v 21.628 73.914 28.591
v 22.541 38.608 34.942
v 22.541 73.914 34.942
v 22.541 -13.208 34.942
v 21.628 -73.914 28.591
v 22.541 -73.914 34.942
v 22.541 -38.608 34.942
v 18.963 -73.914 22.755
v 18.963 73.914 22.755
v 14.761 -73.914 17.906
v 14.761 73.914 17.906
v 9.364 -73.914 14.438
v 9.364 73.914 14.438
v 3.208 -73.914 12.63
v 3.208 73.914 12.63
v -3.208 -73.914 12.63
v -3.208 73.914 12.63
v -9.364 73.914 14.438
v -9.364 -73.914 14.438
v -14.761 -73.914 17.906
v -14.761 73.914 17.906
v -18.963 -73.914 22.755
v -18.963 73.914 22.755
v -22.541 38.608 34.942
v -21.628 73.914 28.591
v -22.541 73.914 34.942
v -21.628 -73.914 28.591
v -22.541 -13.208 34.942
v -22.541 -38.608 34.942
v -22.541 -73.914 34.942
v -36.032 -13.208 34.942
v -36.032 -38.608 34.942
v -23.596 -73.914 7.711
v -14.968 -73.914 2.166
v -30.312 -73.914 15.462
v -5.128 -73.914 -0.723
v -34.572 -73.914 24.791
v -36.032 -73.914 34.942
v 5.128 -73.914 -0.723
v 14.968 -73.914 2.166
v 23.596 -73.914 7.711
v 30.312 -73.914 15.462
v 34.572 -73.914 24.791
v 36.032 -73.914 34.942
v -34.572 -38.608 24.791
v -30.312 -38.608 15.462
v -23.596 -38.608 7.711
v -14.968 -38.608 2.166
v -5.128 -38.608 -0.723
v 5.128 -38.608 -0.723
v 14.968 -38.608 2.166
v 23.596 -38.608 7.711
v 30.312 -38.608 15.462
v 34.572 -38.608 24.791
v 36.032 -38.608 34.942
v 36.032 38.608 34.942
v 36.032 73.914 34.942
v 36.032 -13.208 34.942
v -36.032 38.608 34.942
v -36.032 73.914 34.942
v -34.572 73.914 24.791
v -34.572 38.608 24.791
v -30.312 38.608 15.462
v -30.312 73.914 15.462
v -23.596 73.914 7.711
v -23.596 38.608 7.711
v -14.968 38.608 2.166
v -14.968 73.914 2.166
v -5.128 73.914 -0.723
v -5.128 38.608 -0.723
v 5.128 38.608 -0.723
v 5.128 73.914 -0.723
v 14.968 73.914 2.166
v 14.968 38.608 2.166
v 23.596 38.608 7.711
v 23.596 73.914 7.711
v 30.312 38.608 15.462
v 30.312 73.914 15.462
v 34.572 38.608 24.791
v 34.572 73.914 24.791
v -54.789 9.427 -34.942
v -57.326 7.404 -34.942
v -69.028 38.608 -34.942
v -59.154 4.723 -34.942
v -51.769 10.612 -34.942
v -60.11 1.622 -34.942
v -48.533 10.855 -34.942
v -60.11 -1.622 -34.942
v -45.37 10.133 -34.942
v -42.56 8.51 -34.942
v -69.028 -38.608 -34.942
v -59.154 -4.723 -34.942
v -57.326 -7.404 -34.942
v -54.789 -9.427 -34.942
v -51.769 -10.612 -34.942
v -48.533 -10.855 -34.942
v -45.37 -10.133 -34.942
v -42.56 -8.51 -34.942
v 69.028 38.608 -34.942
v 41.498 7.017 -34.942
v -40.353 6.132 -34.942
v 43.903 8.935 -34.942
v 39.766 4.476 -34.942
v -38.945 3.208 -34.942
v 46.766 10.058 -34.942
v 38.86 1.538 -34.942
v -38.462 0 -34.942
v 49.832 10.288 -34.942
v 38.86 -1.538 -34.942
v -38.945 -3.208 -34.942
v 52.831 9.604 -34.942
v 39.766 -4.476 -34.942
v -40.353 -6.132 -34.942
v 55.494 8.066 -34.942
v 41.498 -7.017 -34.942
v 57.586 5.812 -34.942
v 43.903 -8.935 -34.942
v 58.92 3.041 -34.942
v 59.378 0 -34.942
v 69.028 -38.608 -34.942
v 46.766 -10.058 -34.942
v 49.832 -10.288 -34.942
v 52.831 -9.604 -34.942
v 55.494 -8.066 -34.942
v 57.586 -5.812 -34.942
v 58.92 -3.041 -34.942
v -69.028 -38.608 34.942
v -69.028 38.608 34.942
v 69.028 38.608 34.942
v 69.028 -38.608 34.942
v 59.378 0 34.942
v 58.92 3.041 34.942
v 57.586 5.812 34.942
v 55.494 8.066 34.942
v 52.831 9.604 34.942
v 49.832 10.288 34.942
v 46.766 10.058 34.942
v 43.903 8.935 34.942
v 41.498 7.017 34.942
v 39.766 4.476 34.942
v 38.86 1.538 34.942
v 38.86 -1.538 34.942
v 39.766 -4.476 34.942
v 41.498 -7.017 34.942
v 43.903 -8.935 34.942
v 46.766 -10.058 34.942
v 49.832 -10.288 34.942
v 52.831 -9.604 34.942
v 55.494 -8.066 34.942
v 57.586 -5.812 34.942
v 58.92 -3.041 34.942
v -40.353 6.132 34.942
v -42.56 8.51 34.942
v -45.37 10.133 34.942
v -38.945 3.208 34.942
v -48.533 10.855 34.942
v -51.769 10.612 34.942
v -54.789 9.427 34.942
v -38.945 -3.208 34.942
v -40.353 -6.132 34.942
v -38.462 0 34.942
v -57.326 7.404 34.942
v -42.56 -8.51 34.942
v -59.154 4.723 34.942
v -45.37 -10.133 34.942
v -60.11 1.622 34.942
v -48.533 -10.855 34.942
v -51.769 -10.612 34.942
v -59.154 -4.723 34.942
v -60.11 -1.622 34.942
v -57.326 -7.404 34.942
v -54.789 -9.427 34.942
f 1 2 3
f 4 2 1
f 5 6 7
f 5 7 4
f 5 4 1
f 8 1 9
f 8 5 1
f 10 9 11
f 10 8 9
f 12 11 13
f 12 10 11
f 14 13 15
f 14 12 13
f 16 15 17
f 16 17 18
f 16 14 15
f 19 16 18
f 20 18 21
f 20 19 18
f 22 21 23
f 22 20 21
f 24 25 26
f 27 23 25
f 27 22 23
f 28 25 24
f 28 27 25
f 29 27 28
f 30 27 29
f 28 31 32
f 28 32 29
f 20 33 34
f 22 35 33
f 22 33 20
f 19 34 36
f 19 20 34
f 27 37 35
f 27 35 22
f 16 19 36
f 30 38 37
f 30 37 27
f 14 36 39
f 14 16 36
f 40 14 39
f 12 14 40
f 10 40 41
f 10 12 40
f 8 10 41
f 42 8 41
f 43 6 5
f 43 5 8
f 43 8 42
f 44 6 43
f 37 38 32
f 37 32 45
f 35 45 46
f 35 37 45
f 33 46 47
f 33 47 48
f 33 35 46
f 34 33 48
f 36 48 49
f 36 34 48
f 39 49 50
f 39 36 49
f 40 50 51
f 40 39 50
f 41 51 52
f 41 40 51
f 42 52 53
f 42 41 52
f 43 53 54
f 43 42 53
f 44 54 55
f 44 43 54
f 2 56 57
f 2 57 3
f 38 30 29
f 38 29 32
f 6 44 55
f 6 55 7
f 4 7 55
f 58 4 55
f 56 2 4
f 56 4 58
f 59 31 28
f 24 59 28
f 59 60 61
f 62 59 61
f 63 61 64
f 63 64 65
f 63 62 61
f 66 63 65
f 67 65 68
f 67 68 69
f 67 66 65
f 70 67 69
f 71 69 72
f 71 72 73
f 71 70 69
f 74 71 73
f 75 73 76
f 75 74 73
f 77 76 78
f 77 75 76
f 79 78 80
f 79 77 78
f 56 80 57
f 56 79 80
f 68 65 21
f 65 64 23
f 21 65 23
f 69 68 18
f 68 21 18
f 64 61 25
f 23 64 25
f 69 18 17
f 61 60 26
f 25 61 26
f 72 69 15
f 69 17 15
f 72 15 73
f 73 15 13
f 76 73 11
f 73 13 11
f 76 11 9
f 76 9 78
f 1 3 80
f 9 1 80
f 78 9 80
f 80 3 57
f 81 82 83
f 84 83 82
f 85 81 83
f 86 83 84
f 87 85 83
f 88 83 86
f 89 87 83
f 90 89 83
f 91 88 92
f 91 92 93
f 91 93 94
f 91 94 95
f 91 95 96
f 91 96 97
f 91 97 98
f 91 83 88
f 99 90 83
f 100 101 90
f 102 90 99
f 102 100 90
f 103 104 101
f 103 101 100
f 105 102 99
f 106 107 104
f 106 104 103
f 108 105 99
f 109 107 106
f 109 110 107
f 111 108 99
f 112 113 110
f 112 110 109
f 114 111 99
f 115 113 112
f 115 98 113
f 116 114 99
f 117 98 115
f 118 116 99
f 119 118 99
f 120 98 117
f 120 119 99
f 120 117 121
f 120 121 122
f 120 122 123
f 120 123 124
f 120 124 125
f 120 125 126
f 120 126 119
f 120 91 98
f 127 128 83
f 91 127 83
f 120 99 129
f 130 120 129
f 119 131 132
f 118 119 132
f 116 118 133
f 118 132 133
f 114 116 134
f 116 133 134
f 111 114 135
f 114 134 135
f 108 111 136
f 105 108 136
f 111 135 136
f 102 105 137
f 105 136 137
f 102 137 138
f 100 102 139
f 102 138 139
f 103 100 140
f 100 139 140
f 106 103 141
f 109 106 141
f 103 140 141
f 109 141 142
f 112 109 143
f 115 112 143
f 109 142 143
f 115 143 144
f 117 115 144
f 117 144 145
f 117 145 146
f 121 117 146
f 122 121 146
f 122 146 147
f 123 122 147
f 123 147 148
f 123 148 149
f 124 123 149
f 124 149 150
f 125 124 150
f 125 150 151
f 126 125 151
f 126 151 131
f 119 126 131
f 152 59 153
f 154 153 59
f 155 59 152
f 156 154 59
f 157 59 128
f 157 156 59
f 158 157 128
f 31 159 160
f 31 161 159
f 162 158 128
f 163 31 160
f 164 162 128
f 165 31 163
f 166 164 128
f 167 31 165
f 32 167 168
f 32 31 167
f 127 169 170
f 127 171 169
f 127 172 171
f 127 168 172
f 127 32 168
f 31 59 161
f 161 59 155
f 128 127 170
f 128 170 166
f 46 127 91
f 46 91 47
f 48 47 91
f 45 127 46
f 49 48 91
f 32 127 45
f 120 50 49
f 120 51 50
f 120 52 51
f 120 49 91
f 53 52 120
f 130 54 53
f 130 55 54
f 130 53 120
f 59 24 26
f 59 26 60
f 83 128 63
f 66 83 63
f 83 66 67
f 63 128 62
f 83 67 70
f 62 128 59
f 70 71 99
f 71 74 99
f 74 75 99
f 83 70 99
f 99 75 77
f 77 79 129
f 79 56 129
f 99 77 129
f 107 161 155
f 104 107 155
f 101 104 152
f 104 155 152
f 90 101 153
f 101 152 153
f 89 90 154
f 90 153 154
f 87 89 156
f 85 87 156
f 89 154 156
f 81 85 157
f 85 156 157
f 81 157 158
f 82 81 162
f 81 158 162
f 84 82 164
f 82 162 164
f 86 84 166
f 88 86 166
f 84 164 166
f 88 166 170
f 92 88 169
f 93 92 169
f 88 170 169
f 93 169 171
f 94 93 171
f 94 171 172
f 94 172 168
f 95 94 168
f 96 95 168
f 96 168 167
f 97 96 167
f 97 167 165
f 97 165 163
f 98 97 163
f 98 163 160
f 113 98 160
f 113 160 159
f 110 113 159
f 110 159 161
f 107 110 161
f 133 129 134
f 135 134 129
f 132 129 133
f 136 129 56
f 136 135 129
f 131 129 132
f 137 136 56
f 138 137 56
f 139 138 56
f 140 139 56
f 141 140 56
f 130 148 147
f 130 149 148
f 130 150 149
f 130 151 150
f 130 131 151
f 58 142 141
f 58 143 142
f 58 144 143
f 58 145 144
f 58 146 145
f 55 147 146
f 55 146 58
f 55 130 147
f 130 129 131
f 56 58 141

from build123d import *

# Parameters (mm, degrees)
F1_DEPTH = 73.914
F2_DEPTH = 38.608
F3_DEPTH = 25.4
F4_DEPTH = 87.123
F5_R     = 10.8850211106
F5_R_2   = 10.3170822269
F6_DEPTH = 69.8849575052


with BuildPart() as f1:
    # F0 (on Front) → F1 (new body, symmetric)
    with BuildSketch(Plane.XZ):
        with BuildLine():
            ThreePointArc((-36.0318907806, 34.9419787526), (0, -1.089912028), (36.0318907806, 34.9419787526))
            Line((36.0318907806, 34.9419787526), (22.5412292513, 34.9419787526))
            ThreePointArc((22.5412292513, 34.9419787526), (0, 12.4007495013), (-22.5412292513, 34.9419787526))
            Line((-22.5412292513, 34.9419787526), (-36.0318907806, 34.9419787526))
        make_face()
    extrude(amount=F1_DEPTH, both=True)

    # F0 (on Front) → F2 (join, symmetric)
    with BuildSketch(Plane.XZ):
        with BuildLine():
            Line((69.0282359719, -34.9419787526), (69.0282359719, 34.9419787526))
            Line((69.0282359719, 34.9419787526), (36.0318907806, 34.9419787526))
            ThreePointArc((36.0318907806, 34.9419787526), (0, -1.089912028), (-36.0318907806, 34.9419787526))
            Line((-36.0318907806, 34.9419787526), (-69.0282359719, 34.9419787526))
            Line((-69.0282359719, 34.9419787526), (-69.0282359719, -34.9419787526))
            Line((-69.0282359719, -34.9419787526), (69.0282359719, -34.9419787526))
        make_face()
        with BuildLine():
            ThreePointArc((-36.0318907806, 34.9419787526), (0, -1.089912028), (36.0318907806, 34.9419787526))
            Line((36.0318907806, 34.9419787526), (22.5412292513, 34.9419787526))
            ThreePointArc((22.5412292513, 34.9419787526), (0, 12.4007495013), (-22.5412292513, 34.9419787526))
            Line((-22.5412292513, 34.9419787526), (-36.0318907806, 34.9419787526))
        make_face()
        with BuildLine():
            Line((22.5412292513, 34.9419787526), (36.0318907806, 34.9419787526))
            ThreePointArc((36.0318907806, 34.9419787526), (0, 70.9738695332), (-36.0318907806, 34.9419787526))
            Line((-36.0318907806, 34.9419787526), (-22.5412292513, 34.9419787526))
            ThreePointArc((-22.5412292513, 34.9419787526), (0, 57.4832080039), (22.5412292513, 34.9419787526))
        make_face()
    extrude(amount=F2_DEPTH, both=True)

    # F3 (cut): a face of the model
    f3_faces = [f1.faces().sort_by_distance(p)[0] for p in [
        (29.286560016, -38.608, 35.747676324),
    ]]
    extrude(f3_faces, amount=-F3_DEPTH, mode=Mode.SUBTRACT)

    # F4 (cut, through all): a face of the model
    f4_faces = [f1.faces().sort_by_distance(p)[0] for p in [
        (29.286560016, -13.208, 35.747676324),
    ]]
    extrude(f4_faces, amount=-F4_DEPTH, mode=Mode.SUBTRACT)

    # F5 (on face) → F6 (cut, through all)
    with BuildSketch(Plane.XY.offset(34.9419787526)):
        with Locations((-49.3466295302, 0)):
            Circle(F5_R)
        with Locations((49.0613915026, 0)):
            Circle(F5_R_2)
    extrude(amount=-F6_DEPTH, mode=Mode.SUBTRACT)


solid = f1.part
